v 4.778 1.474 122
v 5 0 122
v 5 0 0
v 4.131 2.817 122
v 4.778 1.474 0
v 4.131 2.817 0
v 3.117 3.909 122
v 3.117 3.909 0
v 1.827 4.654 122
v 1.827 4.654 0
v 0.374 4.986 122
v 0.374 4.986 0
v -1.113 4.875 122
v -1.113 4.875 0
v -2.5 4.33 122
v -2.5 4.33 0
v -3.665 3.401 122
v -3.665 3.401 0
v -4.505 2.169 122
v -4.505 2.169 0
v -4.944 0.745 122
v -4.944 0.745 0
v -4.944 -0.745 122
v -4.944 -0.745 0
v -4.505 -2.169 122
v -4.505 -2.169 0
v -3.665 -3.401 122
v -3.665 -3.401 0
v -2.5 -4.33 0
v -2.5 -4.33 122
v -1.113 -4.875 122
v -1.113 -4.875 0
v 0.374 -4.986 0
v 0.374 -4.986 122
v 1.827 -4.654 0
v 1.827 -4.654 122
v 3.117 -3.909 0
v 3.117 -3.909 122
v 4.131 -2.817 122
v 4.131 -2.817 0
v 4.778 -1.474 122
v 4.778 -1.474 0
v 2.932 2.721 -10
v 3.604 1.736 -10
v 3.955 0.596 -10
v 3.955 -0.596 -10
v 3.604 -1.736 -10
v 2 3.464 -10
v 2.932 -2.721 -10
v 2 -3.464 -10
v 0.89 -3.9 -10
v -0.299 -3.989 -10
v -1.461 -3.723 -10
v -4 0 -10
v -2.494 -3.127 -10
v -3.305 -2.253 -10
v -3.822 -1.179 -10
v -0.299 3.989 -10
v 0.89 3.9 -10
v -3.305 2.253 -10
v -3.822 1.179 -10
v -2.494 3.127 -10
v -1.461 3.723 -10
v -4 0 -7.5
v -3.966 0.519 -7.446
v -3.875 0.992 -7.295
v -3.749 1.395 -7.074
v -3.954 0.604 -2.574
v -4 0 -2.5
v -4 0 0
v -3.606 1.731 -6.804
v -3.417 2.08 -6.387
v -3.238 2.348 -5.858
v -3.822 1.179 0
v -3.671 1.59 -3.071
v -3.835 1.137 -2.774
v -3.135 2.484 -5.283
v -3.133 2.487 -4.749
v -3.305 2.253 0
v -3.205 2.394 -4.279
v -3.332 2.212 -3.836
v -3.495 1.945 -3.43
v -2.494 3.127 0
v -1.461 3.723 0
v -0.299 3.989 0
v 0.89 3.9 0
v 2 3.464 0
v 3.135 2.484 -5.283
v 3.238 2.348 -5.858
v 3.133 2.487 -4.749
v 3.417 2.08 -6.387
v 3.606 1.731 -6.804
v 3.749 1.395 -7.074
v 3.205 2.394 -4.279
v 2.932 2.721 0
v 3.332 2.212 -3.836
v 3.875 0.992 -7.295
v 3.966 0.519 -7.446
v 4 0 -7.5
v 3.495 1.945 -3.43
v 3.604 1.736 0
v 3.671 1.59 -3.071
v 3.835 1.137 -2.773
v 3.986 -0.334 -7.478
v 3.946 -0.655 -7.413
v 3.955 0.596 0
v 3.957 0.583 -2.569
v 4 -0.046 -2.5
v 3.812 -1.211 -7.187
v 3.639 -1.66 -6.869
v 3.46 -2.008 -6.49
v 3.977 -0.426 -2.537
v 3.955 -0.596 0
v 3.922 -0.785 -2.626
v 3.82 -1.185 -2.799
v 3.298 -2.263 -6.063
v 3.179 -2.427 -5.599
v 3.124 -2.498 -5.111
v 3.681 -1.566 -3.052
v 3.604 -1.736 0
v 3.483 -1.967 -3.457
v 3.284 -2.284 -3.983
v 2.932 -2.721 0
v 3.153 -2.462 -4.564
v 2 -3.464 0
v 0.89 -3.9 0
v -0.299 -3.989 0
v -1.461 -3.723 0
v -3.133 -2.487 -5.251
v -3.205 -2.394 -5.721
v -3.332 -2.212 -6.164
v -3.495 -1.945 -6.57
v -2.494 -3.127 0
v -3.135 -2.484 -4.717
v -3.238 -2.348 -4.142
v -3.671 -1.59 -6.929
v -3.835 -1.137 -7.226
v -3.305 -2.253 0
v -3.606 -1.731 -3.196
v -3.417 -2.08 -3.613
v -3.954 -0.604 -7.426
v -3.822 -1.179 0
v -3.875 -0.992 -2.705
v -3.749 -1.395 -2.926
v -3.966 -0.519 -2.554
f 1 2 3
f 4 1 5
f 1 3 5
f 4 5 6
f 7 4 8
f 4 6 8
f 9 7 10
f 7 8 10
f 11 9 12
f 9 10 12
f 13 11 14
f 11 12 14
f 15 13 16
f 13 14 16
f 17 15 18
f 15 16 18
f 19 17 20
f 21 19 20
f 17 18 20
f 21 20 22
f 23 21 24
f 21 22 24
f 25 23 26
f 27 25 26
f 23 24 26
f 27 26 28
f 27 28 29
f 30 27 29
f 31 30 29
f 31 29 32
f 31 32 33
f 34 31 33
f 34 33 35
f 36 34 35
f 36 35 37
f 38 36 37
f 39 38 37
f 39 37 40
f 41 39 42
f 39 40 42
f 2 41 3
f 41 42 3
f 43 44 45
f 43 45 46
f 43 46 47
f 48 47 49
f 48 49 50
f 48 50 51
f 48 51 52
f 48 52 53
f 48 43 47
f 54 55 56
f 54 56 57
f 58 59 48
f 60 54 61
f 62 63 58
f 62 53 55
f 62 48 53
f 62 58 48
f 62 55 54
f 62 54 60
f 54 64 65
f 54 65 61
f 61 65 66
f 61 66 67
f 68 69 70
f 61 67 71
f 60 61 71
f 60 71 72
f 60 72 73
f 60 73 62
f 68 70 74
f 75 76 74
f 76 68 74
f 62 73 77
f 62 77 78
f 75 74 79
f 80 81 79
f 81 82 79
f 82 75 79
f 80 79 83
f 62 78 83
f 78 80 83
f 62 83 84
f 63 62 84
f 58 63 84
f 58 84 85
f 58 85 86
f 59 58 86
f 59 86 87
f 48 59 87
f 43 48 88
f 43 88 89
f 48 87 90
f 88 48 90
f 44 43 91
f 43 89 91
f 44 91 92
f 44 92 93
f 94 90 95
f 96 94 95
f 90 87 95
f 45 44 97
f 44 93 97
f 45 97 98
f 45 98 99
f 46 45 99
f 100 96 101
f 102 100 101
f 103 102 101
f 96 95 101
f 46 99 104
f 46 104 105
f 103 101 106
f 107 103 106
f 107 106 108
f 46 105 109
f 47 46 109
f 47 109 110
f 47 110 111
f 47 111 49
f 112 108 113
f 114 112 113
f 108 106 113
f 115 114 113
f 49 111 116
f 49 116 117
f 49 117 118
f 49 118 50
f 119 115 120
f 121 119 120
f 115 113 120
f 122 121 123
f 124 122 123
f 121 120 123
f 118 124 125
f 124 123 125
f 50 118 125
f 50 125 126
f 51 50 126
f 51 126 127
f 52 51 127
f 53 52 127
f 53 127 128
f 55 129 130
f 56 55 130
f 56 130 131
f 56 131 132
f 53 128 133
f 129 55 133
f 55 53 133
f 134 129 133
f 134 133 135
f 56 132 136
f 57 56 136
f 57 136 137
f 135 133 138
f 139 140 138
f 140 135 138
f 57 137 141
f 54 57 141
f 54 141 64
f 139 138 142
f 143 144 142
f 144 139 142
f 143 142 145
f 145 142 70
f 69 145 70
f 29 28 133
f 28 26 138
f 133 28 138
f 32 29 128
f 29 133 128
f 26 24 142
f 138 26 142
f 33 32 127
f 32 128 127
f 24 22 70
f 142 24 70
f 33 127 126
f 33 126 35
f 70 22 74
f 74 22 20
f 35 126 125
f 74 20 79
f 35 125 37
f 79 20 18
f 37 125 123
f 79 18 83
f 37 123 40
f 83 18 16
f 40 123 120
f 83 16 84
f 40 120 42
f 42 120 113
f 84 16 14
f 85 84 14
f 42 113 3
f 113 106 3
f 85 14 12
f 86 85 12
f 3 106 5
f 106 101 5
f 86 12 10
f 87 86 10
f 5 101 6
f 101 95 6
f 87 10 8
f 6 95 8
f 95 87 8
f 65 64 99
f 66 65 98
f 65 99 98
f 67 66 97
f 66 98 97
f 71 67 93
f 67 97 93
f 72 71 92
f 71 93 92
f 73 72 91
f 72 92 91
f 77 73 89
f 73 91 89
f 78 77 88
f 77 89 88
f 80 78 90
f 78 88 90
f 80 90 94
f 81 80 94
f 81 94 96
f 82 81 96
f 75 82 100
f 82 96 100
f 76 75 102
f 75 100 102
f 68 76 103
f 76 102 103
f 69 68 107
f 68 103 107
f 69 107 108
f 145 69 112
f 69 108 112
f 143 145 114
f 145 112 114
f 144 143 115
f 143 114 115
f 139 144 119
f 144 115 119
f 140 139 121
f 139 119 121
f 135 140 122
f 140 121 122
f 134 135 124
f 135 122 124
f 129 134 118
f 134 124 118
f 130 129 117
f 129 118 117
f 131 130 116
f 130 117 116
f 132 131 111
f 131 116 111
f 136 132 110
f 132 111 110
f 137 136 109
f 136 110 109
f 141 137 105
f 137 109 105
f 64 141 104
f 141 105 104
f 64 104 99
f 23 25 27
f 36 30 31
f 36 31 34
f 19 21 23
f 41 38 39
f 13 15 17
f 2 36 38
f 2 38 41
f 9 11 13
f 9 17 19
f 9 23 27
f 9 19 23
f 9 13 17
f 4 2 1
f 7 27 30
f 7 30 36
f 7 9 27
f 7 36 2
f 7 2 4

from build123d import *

# Parameters (mm, degrees)
SKETCH1_R               = 5
BOSS_EXTRUDE1_DEPTH     = 122
SKETCH2_R               = 4
BOSS_EXTRUDE2_DEPTH     = 10
SKETCH3_R               = 2.5
CUT_EXTRUDE1_DEPTH      = 6
CUT_EXTRUDE1_DEPTH_BACK = 6


with BuildPart() as part:
    # Sketch1 → Boss-Extrude1 (new body)
    with BuildSketch(Plane.XY):
        Circle(SKETCH1_R)
    extrude(amount=BOSS_EXTRUDE1_DEPTH)

    # Sketch2 → Boss-Extrude2 (add)
    with BuildSketch(Plane(origin=(0, 0, 0), x_dir=(-1, 0, 0), z_dir=(0, 0, -1))):
        Circle(SKETCH2_R)
    extrude(amount=BOSS_EXTRUDE2_DEPTH)

    # Sketch3 → Cut-Extrude1 (cut, two sides)
    with BuildSketch(Plane(origin=(0, 0, 0), x_dir=(0, 0, -1), z_dir=(1, 0, 0))) as cut_extrude1_sk:
        with Locations((5, 0)):
            Circle(SKETCH3_R)
    extrude(amount=CUT_EXTRUDE1_DEPTH, mode=Mode.SUBTRACT)
    extrude(cut_extrude1_sk.sketch, amount=-CUT_EXTRUDE1_DEPTH_BACK, mode=Mode.SUBTRACT)


solid = part.part
